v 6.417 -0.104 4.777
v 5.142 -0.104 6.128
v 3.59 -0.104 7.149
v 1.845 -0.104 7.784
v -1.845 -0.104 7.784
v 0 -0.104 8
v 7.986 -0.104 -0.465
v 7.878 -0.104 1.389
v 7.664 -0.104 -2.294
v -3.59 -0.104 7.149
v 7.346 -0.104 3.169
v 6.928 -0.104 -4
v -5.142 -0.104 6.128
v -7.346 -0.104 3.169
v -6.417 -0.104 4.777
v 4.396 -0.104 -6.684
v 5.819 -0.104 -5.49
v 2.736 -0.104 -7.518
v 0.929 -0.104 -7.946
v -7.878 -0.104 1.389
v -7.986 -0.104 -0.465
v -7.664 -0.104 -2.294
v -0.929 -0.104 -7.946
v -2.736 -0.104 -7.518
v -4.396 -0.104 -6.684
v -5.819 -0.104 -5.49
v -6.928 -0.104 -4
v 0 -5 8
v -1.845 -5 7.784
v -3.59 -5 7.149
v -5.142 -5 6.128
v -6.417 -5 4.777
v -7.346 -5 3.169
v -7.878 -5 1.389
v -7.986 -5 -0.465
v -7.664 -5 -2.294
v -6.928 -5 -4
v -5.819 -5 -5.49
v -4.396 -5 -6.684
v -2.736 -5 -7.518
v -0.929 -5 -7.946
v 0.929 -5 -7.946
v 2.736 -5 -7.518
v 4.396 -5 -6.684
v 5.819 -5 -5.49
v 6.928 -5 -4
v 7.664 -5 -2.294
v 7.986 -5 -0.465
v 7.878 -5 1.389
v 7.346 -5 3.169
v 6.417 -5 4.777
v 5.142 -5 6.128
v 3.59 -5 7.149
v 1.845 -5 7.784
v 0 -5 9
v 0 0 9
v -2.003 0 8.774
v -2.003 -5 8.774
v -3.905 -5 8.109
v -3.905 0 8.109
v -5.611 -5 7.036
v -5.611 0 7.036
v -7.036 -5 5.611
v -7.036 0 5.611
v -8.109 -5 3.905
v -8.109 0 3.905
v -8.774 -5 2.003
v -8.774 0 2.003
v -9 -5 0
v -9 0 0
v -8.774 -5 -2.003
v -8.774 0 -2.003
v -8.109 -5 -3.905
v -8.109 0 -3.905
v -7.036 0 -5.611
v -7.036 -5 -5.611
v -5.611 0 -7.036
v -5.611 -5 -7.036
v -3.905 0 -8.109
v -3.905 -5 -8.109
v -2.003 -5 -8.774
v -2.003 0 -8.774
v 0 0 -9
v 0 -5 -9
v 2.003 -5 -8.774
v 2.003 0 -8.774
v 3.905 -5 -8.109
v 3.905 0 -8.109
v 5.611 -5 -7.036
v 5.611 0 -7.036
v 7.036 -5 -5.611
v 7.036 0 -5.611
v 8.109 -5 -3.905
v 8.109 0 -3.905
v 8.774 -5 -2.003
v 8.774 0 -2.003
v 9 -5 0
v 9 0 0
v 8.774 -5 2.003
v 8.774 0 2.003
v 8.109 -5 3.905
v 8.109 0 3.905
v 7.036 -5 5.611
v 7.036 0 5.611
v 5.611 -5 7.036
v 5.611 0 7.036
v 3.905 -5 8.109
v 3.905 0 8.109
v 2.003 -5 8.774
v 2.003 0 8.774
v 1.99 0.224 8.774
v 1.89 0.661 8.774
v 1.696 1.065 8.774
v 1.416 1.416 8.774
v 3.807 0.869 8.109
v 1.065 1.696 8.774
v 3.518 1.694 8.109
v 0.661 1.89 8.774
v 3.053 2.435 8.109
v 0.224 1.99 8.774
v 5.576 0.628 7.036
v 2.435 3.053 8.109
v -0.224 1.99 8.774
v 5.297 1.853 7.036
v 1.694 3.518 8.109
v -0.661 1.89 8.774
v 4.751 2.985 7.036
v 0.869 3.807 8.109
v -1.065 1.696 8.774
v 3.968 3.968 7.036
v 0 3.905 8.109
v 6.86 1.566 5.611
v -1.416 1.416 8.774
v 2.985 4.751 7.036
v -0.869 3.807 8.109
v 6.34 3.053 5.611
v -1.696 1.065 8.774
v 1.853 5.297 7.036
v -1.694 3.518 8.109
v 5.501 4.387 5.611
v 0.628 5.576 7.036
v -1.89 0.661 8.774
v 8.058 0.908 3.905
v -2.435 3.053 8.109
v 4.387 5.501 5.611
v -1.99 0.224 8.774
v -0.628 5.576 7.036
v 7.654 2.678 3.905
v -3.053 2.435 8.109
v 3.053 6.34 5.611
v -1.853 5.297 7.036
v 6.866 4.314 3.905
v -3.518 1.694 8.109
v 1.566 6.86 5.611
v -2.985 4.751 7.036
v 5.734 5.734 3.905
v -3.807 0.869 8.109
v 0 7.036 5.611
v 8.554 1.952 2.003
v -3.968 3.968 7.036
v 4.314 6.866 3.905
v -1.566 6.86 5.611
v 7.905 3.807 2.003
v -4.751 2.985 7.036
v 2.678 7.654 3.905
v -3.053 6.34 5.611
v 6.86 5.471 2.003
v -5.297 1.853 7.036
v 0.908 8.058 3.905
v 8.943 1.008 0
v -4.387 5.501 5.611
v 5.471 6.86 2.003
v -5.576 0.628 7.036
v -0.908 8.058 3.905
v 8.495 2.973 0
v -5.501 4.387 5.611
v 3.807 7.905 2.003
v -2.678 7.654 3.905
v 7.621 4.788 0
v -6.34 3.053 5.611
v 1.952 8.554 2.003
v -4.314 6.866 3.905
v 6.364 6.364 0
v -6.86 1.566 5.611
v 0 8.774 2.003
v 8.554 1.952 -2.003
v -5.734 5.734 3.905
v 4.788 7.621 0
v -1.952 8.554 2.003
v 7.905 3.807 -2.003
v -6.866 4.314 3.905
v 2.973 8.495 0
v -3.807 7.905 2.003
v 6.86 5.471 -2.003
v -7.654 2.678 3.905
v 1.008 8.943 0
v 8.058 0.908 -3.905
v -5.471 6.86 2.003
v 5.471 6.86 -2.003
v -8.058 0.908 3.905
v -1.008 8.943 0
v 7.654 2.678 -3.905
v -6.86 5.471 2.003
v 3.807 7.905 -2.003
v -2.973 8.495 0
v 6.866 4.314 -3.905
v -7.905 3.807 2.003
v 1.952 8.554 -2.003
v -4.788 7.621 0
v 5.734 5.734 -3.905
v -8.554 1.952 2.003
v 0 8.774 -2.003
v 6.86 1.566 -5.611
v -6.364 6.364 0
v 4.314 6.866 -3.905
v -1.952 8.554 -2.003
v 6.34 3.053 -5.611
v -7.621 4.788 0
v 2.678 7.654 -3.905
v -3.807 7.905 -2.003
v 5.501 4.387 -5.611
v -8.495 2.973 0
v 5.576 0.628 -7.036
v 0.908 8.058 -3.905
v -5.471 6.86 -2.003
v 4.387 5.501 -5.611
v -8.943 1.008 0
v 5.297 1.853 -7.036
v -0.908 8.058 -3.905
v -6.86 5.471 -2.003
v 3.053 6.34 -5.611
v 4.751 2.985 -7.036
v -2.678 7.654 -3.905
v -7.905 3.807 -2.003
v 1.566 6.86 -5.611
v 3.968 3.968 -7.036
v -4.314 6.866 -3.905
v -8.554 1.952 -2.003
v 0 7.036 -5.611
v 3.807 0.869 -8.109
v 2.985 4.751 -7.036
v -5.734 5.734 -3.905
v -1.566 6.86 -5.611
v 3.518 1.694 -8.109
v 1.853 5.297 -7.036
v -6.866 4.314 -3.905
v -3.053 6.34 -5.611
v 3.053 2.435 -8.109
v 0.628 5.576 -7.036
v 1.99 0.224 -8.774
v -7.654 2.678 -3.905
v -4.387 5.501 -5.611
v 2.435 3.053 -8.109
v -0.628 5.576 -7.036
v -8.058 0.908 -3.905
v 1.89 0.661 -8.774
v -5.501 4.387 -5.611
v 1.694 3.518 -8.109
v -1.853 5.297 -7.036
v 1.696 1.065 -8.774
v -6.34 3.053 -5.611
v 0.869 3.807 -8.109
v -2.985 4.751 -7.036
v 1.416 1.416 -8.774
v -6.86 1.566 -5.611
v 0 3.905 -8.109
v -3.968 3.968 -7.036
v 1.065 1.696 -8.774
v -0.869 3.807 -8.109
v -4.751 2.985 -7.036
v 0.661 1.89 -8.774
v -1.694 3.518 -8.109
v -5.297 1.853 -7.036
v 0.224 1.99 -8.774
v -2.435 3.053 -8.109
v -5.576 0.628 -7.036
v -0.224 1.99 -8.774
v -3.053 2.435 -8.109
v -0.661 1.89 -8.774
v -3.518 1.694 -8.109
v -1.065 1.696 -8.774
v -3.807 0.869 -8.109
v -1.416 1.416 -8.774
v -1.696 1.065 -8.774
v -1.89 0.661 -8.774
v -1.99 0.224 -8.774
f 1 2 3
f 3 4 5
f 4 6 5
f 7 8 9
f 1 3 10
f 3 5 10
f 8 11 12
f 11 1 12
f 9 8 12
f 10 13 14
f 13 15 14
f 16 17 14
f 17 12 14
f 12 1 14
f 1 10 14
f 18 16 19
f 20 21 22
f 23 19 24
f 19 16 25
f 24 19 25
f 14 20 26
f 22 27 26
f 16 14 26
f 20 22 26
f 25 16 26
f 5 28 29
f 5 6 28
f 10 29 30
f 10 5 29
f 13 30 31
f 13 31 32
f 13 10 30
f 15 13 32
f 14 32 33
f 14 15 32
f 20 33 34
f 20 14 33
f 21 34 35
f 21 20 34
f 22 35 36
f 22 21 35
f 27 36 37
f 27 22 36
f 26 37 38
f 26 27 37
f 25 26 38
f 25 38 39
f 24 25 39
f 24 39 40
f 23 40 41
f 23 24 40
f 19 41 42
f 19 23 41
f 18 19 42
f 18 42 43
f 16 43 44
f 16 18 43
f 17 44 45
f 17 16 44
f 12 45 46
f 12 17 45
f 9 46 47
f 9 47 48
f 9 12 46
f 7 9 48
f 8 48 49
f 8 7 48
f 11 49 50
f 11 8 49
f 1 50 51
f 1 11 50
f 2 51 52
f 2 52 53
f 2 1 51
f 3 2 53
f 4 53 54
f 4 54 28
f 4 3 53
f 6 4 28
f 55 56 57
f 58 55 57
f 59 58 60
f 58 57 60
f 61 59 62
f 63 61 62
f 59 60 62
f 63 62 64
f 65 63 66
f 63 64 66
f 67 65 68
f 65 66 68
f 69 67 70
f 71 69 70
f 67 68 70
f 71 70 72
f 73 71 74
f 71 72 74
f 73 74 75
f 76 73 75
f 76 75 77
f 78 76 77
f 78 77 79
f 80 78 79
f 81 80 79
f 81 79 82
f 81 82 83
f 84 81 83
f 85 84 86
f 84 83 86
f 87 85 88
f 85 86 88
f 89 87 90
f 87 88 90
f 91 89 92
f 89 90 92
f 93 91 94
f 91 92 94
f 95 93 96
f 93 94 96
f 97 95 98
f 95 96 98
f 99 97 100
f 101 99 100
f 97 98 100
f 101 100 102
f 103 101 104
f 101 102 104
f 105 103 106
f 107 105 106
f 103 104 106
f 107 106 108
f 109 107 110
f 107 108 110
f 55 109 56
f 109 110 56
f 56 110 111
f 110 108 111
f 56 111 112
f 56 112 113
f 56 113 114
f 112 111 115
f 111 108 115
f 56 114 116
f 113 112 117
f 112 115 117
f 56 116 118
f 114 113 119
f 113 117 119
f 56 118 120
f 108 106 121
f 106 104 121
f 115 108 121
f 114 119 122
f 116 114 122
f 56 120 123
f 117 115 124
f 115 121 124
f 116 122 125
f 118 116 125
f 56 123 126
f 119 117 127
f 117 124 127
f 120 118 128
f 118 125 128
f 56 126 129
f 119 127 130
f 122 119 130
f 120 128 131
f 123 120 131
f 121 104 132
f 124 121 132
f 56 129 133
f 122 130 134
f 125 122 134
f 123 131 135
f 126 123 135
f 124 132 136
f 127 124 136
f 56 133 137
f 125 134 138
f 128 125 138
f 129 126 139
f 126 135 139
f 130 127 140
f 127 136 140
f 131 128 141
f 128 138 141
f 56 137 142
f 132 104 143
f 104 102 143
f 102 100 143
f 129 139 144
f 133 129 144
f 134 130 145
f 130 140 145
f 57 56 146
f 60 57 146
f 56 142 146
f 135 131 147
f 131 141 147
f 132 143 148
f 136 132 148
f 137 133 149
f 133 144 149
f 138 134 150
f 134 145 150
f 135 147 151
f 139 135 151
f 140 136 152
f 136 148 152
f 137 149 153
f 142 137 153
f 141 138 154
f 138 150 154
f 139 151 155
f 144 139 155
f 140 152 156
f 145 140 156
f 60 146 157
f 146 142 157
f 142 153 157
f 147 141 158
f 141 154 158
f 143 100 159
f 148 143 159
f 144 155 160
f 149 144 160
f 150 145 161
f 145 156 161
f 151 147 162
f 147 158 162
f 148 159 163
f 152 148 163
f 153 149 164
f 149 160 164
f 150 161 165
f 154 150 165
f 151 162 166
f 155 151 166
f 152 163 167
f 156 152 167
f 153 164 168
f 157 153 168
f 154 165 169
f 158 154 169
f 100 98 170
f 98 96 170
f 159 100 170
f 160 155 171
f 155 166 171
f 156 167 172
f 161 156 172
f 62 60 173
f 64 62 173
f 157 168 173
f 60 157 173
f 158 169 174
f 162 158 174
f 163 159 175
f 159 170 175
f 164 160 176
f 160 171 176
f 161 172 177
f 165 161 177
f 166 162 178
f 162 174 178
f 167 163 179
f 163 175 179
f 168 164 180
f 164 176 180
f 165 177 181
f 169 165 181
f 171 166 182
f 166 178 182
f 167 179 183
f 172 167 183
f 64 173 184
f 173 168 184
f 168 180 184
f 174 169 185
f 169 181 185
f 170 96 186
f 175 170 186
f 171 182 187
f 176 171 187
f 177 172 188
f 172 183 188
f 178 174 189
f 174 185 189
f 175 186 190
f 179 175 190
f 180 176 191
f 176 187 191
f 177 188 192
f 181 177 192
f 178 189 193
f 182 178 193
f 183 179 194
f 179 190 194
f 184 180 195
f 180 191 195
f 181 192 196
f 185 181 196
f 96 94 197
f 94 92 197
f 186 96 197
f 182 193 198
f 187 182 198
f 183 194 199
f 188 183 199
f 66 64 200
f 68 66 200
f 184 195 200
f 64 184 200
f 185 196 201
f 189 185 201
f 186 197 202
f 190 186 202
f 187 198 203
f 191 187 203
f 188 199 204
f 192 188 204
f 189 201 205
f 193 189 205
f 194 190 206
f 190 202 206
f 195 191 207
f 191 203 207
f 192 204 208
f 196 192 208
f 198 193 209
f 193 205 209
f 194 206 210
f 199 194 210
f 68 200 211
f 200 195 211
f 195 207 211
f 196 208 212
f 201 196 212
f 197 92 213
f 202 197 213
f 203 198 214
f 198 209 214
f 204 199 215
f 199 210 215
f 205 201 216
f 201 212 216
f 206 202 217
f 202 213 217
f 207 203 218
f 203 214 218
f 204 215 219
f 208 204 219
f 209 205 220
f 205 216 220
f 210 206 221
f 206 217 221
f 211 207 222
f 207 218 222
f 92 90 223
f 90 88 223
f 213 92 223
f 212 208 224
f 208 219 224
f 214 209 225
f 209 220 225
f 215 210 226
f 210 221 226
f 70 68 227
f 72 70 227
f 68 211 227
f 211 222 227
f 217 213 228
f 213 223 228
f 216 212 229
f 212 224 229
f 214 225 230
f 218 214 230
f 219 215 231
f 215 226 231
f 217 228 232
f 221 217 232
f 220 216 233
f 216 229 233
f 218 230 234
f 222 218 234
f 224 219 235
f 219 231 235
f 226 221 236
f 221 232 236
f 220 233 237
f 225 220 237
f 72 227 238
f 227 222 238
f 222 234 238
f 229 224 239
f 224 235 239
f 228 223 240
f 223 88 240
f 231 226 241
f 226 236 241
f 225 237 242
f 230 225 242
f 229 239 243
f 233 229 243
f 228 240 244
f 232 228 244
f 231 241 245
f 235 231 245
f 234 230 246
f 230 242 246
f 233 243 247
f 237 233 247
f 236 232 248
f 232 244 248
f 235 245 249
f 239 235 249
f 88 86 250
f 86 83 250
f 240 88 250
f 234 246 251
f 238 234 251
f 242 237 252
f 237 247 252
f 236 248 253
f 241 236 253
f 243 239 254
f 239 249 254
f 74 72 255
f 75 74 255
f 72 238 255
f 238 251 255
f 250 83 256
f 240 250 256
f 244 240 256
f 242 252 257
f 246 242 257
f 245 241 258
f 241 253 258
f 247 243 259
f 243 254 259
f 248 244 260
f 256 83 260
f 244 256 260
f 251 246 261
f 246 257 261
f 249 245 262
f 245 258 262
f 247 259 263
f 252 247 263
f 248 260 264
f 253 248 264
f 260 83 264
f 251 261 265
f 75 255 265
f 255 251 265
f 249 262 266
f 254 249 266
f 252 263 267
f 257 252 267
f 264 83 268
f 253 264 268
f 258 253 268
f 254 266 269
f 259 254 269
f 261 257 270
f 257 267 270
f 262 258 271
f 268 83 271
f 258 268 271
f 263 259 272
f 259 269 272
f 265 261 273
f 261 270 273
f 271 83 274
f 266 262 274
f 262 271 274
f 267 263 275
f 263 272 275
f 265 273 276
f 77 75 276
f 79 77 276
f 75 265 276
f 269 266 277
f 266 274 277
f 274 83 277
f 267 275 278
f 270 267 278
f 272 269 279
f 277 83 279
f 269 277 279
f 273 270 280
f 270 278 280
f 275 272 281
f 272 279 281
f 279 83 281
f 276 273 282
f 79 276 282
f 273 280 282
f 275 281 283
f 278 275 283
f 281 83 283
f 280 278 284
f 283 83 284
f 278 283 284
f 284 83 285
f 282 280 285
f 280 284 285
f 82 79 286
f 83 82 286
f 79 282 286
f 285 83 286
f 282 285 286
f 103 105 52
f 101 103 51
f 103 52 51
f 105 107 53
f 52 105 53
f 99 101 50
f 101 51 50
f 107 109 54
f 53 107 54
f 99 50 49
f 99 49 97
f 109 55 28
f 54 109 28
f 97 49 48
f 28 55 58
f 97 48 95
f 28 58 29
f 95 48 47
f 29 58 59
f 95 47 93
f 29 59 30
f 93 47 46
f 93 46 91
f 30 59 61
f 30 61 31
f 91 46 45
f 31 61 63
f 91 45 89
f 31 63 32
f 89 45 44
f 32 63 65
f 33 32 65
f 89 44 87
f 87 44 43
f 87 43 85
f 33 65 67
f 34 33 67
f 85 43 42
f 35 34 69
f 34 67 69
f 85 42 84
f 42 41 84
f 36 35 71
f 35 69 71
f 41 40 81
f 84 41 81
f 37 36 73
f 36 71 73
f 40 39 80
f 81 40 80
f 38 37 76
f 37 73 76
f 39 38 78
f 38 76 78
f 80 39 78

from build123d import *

# Parameters (mm, degrees)
REVOLVE_1_ANGLE = 180
SKETCH_6_W      = 9
SKETCH_6_H      = 5
SKETCH_7_W      = 8
SKETCH_7_H      = 4.896318498


with BuildPart() as part:
    # 草图1 → 旋转1 (revolve)
    with BuildSketch(Plane(origin=(0, 0, 0), x_dir=(1, 0, 0), z_dir=(0, 1, 0))):
        with BuildLine():
            Line((0, 9), (0, -9))
            ThreePointArc((0, -9), (9, 0), (0, 9))
        make_face()
    revolve(axis=Axis((0, 0, -9), (0, 0, 1)), revolution_arc=REVOLVE_1_ANGLE)

    # 草图6 → 旋转2 (revolve)
    with BuildSketch(Plane(origin=(0, 0, 0), x_dir=(0, 0, -1), z_dir=(1, 0, 0)), mode=Mode.PRIVATE) as revolve_2_sk:
        with Locations((4.5, -2.5)):
            Rectangle(SKETCH_6_W, SKETCH_6_H)
    revolve(revolve_2_sk.sketch.rotate(Axis((0, 0, 0), (0, -1, 0)), 180), axis=Axis((0, 0, 0), (0, -1, 0)))

    # 草图7 → 切除-旋转2 (revolve, cut)
    with BuildSketch(Plane(origin=(0, 0, 0), x_dir=(0, 0, -1), z_dir=(1, 0, 0)), mode=Mode.PRIVATE) as cut_revolve_2_sk:
        with Locations((4, -2.551840751)):
            Rectangle(SKETCH_7_W, SKETCH_7_H)
    revolve(cut_revolve_2_sk.sketch.rotate(Axis((0, -0.103681502, 0), (0, -1, 0)), 180), axis=Axis((0, -0.103681502, 0), (0, -1, 0)), mode=Mode.SUBTRACT)


solid = part.part
